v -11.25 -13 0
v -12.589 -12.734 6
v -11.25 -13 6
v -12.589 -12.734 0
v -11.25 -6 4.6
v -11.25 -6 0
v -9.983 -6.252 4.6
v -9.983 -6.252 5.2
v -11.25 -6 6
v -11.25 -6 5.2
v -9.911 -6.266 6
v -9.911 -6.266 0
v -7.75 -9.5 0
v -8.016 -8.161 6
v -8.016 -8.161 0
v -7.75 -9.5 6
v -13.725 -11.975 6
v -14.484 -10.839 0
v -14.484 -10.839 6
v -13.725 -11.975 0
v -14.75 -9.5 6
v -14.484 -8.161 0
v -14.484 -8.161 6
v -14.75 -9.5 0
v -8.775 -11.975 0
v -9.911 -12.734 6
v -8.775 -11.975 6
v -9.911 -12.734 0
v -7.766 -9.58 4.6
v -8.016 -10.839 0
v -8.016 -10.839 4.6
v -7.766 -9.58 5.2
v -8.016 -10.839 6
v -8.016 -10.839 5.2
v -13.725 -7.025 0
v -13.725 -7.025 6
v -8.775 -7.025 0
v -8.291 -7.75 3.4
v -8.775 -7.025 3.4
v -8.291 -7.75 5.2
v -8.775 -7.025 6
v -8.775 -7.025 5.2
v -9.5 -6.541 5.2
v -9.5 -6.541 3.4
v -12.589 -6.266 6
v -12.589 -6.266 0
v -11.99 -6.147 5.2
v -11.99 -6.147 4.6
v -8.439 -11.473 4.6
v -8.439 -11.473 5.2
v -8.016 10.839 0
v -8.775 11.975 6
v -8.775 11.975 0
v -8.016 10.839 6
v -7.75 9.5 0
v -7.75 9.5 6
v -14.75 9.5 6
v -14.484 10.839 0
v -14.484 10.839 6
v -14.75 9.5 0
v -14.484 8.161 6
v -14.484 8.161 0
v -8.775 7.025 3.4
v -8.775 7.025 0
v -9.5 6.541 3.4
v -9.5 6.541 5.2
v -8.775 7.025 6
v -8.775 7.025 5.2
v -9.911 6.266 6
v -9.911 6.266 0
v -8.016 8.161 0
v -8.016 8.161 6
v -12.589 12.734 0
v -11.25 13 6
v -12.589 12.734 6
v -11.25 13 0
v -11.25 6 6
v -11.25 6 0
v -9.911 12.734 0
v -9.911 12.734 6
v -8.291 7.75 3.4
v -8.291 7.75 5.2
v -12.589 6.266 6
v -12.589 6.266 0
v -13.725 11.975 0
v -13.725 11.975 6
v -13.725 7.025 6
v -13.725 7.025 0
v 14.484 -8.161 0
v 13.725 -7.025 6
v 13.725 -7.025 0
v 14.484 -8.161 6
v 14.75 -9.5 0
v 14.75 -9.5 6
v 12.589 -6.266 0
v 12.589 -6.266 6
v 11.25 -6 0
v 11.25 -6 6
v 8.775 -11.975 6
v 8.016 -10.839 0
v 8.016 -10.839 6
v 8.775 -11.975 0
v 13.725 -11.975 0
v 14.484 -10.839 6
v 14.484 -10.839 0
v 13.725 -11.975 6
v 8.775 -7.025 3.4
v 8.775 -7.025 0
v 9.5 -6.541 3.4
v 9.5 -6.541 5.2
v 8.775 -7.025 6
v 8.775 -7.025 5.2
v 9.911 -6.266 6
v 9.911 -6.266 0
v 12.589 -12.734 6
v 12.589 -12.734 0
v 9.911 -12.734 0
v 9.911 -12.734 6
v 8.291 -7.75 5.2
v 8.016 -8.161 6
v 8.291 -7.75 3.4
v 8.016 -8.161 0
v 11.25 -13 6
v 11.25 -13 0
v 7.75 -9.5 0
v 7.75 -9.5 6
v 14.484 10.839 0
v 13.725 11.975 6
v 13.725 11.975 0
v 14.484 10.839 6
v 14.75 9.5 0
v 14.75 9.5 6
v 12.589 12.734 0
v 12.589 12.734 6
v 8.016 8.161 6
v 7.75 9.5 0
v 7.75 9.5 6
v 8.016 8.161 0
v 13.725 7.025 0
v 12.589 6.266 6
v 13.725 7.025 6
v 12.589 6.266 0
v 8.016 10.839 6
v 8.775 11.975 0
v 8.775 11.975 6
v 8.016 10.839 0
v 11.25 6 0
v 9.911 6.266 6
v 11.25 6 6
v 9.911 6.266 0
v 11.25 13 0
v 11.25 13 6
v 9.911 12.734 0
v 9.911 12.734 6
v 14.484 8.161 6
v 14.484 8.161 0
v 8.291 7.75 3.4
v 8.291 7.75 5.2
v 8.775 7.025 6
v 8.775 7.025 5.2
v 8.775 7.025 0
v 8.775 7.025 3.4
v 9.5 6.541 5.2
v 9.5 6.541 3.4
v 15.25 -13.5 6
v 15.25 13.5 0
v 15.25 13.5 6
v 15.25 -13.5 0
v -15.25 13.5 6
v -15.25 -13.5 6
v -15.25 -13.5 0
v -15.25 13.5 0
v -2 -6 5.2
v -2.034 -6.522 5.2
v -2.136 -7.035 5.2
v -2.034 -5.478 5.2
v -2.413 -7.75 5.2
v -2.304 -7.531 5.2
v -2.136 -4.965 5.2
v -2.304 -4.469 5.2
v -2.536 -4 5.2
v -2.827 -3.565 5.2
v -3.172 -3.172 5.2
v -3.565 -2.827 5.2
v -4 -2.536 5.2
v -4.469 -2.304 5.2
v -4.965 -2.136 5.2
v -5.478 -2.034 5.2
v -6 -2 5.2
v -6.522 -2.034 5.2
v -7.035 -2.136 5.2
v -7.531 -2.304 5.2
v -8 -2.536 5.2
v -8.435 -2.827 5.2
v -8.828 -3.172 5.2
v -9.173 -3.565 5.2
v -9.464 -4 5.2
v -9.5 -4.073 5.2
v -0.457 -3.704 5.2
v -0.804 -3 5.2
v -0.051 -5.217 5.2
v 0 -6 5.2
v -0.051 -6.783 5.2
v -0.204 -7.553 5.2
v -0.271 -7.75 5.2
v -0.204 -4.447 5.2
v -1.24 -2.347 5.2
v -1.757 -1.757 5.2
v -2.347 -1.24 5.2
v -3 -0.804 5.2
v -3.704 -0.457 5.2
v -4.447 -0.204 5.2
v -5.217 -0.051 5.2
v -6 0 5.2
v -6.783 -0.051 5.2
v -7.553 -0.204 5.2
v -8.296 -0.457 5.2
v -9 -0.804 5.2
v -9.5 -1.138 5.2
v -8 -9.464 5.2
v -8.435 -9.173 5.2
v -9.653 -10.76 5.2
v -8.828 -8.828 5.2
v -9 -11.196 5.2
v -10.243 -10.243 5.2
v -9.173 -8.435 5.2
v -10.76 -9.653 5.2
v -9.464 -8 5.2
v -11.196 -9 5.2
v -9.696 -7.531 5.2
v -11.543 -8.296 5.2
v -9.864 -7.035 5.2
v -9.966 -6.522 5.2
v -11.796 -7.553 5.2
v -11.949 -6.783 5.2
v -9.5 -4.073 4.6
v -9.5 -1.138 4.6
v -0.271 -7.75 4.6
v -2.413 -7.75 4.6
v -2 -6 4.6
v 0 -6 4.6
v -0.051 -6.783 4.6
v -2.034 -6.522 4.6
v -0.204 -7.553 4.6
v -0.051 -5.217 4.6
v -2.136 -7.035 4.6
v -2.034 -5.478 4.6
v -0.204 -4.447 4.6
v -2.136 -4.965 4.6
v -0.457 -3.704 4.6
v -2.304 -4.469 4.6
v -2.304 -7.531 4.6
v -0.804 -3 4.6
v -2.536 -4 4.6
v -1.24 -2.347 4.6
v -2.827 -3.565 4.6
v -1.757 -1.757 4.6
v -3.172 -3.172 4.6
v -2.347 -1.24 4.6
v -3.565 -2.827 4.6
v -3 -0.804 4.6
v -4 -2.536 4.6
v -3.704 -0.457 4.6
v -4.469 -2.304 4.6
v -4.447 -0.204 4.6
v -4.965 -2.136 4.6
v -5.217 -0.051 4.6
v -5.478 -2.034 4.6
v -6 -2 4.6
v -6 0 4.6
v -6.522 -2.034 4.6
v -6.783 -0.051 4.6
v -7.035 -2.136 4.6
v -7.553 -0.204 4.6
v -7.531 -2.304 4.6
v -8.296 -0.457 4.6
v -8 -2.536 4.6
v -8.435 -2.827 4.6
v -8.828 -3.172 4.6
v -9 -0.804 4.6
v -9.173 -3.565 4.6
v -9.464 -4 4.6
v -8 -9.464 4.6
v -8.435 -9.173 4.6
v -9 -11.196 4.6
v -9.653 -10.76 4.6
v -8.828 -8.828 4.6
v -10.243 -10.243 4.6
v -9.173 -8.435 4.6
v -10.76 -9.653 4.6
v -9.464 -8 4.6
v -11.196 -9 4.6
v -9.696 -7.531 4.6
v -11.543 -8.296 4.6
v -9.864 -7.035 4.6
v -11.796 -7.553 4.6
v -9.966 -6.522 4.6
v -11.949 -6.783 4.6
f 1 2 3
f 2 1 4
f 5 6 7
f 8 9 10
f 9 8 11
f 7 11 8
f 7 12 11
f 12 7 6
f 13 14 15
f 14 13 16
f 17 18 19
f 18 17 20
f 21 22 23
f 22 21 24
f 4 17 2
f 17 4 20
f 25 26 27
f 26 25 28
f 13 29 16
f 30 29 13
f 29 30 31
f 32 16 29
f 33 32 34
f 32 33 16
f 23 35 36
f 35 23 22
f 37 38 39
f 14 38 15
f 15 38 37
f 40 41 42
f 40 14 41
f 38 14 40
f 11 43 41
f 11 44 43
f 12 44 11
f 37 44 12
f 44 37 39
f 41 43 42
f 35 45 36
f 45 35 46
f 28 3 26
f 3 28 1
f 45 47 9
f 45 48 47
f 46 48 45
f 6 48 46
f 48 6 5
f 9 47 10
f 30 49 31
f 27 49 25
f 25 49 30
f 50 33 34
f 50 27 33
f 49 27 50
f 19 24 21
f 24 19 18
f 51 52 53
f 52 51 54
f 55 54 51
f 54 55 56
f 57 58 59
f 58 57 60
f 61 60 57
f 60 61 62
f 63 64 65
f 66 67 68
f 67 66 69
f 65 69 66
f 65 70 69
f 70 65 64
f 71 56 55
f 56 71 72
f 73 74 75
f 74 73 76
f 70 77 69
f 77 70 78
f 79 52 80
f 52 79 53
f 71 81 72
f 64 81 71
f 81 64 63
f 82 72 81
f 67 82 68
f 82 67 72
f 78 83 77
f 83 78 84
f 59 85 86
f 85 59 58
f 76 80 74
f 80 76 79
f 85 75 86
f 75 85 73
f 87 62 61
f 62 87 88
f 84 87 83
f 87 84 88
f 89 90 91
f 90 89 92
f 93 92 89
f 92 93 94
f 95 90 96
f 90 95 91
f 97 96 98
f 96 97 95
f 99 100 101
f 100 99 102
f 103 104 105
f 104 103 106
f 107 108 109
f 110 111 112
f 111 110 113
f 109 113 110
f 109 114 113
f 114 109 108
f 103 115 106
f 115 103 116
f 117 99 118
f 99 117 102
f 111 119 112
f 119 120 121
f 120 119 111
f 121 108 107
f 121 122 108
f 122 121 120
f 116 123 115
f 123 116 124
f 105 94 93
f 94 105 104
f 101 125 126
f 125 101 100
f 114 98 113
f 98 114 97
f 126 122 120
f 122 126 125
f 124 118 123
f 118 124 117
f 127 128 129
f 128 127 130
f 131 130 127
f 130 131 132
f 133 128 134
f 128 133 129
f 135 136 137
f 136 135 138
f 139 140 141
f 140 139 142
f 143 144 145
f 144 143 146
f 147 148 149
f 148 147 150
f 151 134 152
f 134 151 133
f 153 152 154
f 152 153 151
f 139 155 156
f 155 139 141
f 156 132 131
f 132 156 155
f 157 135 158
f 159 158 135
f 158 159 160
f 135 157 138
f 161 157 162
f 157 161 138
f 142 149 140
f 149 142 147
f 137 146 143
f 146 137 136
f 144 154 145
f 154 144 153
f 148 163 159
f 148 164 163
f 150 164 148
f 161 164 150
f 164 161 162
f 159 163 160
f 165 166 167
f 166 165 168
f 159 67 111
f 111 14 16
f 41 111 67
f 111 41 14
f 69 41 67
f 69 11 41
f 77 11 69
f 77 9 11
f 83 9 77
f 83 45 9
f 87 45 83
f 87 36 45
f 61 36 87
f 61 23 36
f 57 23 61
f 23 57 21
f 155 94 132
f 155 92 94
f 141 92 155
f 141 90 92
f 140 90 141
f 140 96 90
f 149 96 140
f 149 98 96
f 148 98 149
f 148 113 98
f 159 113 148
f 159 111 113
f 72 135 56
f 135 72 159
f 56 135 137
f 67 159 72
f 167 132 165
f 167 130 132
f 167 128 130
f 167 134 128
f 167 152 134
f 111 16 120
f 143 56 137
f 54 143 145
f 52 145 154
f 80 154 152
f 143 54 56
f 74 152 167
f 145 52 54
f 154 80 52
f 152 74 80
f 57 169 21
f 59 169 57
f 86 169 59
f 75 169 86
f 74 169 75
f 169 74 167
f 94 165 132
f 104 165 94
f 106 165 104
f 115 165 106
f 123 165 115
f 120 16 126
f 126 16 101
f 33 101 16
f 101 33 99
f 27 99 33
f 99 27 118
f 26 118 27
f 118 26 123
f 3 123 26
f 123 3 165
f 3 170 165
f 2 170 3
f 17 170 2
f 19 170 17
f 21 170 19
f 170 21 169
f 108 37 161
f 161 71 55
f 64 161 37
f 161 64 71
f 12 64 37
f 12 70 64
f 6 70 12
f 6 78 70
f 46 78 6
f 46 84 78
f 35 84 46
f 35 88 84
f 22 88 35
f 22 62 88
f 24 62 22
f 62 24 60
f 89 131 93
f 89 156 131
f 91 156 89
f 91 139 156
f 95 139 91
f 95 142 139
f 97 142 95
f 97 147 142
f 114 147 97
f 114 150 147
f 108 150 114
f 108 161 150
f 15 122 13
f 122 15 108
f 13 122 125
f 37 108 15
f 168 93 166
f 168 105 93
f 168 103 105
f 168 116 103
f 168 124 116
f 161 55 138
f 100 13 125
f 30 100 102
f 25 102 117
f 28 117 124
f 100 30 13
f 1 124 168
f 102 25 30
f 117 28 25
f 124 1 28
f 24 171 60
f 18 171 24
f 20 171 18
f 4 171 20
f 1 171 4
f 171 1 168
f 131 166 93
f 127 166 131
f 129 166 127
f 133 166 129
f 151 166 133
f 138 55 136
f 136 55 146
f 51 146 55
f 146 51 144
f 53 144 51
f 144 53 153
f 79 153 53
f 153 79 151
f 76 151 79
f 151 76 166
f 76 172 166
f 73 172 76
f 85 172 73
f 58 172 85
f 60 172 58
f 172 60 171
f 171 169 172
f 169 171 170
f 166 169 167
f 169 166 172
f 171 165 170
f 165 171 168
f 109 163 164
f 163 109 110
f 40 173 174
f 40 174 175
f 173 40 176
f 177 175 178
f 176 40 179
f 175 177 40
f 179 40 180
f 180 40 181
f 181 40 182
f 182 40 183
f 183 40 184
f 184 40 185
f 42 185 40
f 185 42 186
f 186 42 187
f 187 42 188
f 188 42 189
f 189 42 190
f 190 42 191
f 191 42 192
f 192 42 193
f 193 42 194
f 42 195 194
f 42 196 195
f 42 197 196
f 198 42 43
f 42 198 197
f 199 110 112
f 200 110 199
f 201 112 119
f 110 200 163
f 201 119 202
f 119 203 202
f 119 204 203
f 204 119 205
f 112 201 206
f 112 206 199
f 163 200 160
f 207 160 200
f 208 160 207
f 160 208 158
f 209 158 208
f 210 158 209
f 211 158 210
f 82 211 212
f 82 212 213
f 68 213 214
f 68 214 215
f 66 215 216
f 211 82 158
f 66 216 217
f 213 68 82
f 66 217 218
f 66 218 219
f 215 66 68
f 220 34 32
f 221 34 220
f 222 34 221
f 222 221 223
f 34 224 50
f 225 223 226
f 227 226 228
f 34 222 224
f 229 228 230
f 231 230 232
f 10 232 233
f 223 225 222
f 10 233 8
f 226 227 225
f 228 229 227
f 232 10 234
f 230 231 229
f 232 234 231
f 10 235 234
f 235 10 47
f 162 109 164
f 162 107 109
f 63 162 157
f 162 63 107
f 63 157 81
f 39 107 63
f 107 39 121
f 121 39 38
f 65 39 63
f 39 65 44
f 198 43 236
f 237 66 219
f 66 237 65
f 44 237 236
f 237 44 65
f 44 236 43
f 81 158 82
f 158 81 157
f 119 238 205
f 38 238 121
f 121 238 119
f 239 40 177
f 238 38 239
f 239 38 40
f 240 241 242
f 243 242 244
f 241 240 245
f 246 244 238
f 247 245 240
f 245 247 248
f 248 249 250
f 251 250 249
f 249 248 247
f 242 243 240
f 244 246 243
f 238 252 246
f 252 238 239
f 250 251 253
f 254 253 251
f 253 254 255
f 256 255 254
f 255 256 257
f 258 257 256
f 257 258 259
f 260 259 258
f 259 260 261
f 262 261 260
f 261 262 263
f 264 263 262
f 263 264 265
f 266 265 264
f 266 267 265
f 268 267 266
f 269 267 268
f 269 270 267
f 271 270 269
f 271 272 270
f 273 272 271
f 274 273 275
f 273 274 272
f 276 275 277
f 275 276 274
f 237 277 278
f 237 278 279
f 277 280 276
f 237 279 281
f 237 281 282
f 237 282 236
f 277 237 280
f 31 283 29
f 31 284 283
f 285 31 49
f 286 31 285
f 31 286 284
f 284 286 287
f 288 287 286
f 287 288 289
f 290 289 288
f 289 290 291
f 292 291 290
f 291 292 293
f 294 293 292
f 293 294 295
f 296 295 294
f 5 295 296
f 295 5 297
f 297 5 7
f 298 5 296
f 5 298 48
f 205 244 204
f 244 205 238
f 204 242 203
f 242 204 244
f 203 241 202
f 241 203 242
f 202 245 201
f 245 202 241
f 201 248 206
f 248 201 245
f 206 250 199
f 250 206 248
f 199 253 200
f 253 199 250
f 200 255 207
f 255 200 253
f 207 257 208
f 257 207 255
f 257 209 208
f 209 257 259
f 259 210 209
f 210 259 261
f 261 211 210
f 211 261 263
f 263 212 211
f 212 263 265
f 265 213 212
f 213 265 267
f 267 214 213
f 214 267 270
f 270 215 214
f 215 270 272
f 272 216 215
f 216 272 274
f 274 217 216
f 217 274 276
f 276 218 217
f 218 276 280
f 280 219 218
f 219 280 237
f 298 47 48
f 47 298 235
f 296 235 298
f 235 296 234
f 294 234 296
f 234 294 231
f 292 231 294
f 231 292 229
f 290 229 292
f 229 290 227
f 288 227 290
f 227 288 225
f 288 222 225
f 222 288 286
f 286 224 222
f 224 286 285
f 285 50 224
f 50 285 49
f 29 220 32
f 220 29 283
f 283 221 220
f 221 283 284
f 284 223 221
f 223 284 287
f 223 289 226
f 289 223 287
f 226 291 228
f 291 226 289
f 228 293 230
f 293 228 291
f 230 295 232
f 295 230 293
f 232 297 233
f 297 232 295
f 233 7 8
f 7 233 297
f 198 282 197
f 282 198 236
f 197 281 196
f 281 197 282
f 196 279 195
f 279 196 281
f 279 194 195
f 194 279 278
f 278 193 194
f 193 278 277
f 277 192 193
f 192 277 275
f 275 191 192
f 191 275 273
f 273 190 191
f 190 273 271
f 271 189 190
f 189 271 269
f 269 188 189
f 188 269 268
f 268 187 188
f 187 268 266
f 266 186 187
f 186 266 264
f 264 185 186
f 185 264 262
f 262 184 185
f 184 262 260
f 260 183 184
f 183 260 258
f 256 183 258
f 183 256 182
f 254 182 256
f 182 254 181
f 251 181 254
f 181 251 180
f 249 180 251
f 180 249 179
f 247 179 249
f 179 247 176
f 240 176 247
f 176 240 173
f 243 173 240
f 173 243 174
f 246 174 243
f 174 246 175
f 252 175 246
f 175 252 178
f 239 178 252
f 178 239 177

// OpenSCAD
// KY-003 Hall Module Fit Gauge (Jig 17)
// ===========================================================================
// Fit-check jig for the BOM "Hall sensors KY-003" (dock water-level /
// canister-present sensing, x4).
//
//  FEATURE A — Envelope fit recess. A drop-in recess milled to pcb_t depth at
//  exactly (PCB outline + pocket_clearance). A board that seats flush and
//  level in the recess confirms the sourced KY-003 envelope; a board that
//  does not fit (or rattles) tunes pocket_clearance. The recess floor carries
//  a crosshair ring marking the (estimate) A3144 marked-face spot so the
//  sensing test (Feature B / Jig 18) is aimed repeatably. The recess does NOT
//  stand in for production retention — the dock housing will screw/glue the
//  board; this jig only verifies the envelope and the slide/drop fit.
//  Tune pocket_clearance, never the part.
//
//  FEATURE B — the sensing-axis standoff (magnet-to-marked-face gap at which
//  YOUR float magnet still toggles the A3144) is measured with the separate
//  print `ky003-standoff-kit.scad` (Jig 18): exact-height spacer cubes placed
//  between the exposed marked face and the magnet. That number (NOT the PCB
//  mm) drives the dock housing cast-wall thickness and float travel budget.
//
// Parameter provenance mirrors ky003-hall-sensor.scad (all fetched 2026-08-17):
//   pcb_l/pcb_w      — standard 18.5 x 15 (secondary: arduinomodules.info) or
//                      joyit 30 x 15 (datasheet: JOY-IT SEN-KY003HMS) per variant
//   Everything else — (estimate), tune per print + actual part.
//
// Pass criteria + fail->fix mapping: PRINT-TEST.md Jig 17 (Feature A) and
// Jig 18 (Feature B).
// License: CC BY-SA 4.0

$fn = 48;

/* [Jig dimensions - EDIT] */
variant         = "standard"; // "standard" | "joyit" — keep SAME as the model
pcb_l           = (variant == "joyit") ? 30.0 : 18.5; // mm (see provenance above)
pcb_w           = (variant == "joyit") ? 15.0 : 15.0; // mm
pcb_t           = 1.6;  // mm (estimate) FR4 thickness

pocket_clearance = 0.5; // mm (estimate) DIAMETRAL recess clearance. Start 0.5;
                        //   tight->0.3, loose->0.8 (see Jig 17 FAIL->FIX)

// (estimate geometry) — A3144 marked-face spot marker on the recess floor.
sensor_x        = pcb_l/2;   // mm (estimate) sensor center from the -L edge
sensor_y        = pcb_w/2;   // mm (estimate) sensor center across width

// --- Jig plate ---
plate_margin   = 6;       // mm margin around recess
plate_z        = 6;       // mm base thickness (recess depth 1.6 sits below top)

// ===== GEOMETRY (origin = plate center on xy; plate floor at z = 0) =====
plate_L = pcb_l + 2 * plate_margin;
plate_W = pcb_w + 2 * plate_margin;

// interior recess dims
in_l = pcb_l + pocket_clearance;
in_w = pcb_w + pocket_clearance;

module base_plate() {
    // Plate floor at z = 0 (bottom), top at z = plate_z.
    difference() {
        translate([0, 0, plate_z/2]) cube([plate_L, plate_W, plate_z], center = true);
        for (dx = [-1, 1], dy = [-1, 1])
            translate([dx * (plate_L/2 - 4), dy * (plate_W/2 - 4), -1])
                cylinder(d = 7, h = plate_z + 2, $fn = 16);
        // ---- FEATURE A: envelope recess (drop-in, pcb_t deep) ----
        translate([0, 0, plate_z - pcb_t - 0.1])
            cube([in_l, in_w, pcb_t + 0.2], center = true);
        // finger notch at the +L edge so the board lifts out cleanly
        translate([plate_L/2 + 1, 0, plate_z - pcb_t])
            cube([plate_margin + 1, 8, pcb_t + 0.3]);
    }

    // ---- FEATURE A marker ring on the recess floor (assumed sensor spot) ----
    translate([sensor_x - plate_L/2, sensor_y - plate_W/2, plate_z - pcb_t + 0.2])
        linear_extrude(height = 0.6)
            difference() {
                circle(r = 6, $fn = 48);
                circle(r = 4, $fn = 48);
            }
}

// ===== ASSEMBLY =====
base_plate();
